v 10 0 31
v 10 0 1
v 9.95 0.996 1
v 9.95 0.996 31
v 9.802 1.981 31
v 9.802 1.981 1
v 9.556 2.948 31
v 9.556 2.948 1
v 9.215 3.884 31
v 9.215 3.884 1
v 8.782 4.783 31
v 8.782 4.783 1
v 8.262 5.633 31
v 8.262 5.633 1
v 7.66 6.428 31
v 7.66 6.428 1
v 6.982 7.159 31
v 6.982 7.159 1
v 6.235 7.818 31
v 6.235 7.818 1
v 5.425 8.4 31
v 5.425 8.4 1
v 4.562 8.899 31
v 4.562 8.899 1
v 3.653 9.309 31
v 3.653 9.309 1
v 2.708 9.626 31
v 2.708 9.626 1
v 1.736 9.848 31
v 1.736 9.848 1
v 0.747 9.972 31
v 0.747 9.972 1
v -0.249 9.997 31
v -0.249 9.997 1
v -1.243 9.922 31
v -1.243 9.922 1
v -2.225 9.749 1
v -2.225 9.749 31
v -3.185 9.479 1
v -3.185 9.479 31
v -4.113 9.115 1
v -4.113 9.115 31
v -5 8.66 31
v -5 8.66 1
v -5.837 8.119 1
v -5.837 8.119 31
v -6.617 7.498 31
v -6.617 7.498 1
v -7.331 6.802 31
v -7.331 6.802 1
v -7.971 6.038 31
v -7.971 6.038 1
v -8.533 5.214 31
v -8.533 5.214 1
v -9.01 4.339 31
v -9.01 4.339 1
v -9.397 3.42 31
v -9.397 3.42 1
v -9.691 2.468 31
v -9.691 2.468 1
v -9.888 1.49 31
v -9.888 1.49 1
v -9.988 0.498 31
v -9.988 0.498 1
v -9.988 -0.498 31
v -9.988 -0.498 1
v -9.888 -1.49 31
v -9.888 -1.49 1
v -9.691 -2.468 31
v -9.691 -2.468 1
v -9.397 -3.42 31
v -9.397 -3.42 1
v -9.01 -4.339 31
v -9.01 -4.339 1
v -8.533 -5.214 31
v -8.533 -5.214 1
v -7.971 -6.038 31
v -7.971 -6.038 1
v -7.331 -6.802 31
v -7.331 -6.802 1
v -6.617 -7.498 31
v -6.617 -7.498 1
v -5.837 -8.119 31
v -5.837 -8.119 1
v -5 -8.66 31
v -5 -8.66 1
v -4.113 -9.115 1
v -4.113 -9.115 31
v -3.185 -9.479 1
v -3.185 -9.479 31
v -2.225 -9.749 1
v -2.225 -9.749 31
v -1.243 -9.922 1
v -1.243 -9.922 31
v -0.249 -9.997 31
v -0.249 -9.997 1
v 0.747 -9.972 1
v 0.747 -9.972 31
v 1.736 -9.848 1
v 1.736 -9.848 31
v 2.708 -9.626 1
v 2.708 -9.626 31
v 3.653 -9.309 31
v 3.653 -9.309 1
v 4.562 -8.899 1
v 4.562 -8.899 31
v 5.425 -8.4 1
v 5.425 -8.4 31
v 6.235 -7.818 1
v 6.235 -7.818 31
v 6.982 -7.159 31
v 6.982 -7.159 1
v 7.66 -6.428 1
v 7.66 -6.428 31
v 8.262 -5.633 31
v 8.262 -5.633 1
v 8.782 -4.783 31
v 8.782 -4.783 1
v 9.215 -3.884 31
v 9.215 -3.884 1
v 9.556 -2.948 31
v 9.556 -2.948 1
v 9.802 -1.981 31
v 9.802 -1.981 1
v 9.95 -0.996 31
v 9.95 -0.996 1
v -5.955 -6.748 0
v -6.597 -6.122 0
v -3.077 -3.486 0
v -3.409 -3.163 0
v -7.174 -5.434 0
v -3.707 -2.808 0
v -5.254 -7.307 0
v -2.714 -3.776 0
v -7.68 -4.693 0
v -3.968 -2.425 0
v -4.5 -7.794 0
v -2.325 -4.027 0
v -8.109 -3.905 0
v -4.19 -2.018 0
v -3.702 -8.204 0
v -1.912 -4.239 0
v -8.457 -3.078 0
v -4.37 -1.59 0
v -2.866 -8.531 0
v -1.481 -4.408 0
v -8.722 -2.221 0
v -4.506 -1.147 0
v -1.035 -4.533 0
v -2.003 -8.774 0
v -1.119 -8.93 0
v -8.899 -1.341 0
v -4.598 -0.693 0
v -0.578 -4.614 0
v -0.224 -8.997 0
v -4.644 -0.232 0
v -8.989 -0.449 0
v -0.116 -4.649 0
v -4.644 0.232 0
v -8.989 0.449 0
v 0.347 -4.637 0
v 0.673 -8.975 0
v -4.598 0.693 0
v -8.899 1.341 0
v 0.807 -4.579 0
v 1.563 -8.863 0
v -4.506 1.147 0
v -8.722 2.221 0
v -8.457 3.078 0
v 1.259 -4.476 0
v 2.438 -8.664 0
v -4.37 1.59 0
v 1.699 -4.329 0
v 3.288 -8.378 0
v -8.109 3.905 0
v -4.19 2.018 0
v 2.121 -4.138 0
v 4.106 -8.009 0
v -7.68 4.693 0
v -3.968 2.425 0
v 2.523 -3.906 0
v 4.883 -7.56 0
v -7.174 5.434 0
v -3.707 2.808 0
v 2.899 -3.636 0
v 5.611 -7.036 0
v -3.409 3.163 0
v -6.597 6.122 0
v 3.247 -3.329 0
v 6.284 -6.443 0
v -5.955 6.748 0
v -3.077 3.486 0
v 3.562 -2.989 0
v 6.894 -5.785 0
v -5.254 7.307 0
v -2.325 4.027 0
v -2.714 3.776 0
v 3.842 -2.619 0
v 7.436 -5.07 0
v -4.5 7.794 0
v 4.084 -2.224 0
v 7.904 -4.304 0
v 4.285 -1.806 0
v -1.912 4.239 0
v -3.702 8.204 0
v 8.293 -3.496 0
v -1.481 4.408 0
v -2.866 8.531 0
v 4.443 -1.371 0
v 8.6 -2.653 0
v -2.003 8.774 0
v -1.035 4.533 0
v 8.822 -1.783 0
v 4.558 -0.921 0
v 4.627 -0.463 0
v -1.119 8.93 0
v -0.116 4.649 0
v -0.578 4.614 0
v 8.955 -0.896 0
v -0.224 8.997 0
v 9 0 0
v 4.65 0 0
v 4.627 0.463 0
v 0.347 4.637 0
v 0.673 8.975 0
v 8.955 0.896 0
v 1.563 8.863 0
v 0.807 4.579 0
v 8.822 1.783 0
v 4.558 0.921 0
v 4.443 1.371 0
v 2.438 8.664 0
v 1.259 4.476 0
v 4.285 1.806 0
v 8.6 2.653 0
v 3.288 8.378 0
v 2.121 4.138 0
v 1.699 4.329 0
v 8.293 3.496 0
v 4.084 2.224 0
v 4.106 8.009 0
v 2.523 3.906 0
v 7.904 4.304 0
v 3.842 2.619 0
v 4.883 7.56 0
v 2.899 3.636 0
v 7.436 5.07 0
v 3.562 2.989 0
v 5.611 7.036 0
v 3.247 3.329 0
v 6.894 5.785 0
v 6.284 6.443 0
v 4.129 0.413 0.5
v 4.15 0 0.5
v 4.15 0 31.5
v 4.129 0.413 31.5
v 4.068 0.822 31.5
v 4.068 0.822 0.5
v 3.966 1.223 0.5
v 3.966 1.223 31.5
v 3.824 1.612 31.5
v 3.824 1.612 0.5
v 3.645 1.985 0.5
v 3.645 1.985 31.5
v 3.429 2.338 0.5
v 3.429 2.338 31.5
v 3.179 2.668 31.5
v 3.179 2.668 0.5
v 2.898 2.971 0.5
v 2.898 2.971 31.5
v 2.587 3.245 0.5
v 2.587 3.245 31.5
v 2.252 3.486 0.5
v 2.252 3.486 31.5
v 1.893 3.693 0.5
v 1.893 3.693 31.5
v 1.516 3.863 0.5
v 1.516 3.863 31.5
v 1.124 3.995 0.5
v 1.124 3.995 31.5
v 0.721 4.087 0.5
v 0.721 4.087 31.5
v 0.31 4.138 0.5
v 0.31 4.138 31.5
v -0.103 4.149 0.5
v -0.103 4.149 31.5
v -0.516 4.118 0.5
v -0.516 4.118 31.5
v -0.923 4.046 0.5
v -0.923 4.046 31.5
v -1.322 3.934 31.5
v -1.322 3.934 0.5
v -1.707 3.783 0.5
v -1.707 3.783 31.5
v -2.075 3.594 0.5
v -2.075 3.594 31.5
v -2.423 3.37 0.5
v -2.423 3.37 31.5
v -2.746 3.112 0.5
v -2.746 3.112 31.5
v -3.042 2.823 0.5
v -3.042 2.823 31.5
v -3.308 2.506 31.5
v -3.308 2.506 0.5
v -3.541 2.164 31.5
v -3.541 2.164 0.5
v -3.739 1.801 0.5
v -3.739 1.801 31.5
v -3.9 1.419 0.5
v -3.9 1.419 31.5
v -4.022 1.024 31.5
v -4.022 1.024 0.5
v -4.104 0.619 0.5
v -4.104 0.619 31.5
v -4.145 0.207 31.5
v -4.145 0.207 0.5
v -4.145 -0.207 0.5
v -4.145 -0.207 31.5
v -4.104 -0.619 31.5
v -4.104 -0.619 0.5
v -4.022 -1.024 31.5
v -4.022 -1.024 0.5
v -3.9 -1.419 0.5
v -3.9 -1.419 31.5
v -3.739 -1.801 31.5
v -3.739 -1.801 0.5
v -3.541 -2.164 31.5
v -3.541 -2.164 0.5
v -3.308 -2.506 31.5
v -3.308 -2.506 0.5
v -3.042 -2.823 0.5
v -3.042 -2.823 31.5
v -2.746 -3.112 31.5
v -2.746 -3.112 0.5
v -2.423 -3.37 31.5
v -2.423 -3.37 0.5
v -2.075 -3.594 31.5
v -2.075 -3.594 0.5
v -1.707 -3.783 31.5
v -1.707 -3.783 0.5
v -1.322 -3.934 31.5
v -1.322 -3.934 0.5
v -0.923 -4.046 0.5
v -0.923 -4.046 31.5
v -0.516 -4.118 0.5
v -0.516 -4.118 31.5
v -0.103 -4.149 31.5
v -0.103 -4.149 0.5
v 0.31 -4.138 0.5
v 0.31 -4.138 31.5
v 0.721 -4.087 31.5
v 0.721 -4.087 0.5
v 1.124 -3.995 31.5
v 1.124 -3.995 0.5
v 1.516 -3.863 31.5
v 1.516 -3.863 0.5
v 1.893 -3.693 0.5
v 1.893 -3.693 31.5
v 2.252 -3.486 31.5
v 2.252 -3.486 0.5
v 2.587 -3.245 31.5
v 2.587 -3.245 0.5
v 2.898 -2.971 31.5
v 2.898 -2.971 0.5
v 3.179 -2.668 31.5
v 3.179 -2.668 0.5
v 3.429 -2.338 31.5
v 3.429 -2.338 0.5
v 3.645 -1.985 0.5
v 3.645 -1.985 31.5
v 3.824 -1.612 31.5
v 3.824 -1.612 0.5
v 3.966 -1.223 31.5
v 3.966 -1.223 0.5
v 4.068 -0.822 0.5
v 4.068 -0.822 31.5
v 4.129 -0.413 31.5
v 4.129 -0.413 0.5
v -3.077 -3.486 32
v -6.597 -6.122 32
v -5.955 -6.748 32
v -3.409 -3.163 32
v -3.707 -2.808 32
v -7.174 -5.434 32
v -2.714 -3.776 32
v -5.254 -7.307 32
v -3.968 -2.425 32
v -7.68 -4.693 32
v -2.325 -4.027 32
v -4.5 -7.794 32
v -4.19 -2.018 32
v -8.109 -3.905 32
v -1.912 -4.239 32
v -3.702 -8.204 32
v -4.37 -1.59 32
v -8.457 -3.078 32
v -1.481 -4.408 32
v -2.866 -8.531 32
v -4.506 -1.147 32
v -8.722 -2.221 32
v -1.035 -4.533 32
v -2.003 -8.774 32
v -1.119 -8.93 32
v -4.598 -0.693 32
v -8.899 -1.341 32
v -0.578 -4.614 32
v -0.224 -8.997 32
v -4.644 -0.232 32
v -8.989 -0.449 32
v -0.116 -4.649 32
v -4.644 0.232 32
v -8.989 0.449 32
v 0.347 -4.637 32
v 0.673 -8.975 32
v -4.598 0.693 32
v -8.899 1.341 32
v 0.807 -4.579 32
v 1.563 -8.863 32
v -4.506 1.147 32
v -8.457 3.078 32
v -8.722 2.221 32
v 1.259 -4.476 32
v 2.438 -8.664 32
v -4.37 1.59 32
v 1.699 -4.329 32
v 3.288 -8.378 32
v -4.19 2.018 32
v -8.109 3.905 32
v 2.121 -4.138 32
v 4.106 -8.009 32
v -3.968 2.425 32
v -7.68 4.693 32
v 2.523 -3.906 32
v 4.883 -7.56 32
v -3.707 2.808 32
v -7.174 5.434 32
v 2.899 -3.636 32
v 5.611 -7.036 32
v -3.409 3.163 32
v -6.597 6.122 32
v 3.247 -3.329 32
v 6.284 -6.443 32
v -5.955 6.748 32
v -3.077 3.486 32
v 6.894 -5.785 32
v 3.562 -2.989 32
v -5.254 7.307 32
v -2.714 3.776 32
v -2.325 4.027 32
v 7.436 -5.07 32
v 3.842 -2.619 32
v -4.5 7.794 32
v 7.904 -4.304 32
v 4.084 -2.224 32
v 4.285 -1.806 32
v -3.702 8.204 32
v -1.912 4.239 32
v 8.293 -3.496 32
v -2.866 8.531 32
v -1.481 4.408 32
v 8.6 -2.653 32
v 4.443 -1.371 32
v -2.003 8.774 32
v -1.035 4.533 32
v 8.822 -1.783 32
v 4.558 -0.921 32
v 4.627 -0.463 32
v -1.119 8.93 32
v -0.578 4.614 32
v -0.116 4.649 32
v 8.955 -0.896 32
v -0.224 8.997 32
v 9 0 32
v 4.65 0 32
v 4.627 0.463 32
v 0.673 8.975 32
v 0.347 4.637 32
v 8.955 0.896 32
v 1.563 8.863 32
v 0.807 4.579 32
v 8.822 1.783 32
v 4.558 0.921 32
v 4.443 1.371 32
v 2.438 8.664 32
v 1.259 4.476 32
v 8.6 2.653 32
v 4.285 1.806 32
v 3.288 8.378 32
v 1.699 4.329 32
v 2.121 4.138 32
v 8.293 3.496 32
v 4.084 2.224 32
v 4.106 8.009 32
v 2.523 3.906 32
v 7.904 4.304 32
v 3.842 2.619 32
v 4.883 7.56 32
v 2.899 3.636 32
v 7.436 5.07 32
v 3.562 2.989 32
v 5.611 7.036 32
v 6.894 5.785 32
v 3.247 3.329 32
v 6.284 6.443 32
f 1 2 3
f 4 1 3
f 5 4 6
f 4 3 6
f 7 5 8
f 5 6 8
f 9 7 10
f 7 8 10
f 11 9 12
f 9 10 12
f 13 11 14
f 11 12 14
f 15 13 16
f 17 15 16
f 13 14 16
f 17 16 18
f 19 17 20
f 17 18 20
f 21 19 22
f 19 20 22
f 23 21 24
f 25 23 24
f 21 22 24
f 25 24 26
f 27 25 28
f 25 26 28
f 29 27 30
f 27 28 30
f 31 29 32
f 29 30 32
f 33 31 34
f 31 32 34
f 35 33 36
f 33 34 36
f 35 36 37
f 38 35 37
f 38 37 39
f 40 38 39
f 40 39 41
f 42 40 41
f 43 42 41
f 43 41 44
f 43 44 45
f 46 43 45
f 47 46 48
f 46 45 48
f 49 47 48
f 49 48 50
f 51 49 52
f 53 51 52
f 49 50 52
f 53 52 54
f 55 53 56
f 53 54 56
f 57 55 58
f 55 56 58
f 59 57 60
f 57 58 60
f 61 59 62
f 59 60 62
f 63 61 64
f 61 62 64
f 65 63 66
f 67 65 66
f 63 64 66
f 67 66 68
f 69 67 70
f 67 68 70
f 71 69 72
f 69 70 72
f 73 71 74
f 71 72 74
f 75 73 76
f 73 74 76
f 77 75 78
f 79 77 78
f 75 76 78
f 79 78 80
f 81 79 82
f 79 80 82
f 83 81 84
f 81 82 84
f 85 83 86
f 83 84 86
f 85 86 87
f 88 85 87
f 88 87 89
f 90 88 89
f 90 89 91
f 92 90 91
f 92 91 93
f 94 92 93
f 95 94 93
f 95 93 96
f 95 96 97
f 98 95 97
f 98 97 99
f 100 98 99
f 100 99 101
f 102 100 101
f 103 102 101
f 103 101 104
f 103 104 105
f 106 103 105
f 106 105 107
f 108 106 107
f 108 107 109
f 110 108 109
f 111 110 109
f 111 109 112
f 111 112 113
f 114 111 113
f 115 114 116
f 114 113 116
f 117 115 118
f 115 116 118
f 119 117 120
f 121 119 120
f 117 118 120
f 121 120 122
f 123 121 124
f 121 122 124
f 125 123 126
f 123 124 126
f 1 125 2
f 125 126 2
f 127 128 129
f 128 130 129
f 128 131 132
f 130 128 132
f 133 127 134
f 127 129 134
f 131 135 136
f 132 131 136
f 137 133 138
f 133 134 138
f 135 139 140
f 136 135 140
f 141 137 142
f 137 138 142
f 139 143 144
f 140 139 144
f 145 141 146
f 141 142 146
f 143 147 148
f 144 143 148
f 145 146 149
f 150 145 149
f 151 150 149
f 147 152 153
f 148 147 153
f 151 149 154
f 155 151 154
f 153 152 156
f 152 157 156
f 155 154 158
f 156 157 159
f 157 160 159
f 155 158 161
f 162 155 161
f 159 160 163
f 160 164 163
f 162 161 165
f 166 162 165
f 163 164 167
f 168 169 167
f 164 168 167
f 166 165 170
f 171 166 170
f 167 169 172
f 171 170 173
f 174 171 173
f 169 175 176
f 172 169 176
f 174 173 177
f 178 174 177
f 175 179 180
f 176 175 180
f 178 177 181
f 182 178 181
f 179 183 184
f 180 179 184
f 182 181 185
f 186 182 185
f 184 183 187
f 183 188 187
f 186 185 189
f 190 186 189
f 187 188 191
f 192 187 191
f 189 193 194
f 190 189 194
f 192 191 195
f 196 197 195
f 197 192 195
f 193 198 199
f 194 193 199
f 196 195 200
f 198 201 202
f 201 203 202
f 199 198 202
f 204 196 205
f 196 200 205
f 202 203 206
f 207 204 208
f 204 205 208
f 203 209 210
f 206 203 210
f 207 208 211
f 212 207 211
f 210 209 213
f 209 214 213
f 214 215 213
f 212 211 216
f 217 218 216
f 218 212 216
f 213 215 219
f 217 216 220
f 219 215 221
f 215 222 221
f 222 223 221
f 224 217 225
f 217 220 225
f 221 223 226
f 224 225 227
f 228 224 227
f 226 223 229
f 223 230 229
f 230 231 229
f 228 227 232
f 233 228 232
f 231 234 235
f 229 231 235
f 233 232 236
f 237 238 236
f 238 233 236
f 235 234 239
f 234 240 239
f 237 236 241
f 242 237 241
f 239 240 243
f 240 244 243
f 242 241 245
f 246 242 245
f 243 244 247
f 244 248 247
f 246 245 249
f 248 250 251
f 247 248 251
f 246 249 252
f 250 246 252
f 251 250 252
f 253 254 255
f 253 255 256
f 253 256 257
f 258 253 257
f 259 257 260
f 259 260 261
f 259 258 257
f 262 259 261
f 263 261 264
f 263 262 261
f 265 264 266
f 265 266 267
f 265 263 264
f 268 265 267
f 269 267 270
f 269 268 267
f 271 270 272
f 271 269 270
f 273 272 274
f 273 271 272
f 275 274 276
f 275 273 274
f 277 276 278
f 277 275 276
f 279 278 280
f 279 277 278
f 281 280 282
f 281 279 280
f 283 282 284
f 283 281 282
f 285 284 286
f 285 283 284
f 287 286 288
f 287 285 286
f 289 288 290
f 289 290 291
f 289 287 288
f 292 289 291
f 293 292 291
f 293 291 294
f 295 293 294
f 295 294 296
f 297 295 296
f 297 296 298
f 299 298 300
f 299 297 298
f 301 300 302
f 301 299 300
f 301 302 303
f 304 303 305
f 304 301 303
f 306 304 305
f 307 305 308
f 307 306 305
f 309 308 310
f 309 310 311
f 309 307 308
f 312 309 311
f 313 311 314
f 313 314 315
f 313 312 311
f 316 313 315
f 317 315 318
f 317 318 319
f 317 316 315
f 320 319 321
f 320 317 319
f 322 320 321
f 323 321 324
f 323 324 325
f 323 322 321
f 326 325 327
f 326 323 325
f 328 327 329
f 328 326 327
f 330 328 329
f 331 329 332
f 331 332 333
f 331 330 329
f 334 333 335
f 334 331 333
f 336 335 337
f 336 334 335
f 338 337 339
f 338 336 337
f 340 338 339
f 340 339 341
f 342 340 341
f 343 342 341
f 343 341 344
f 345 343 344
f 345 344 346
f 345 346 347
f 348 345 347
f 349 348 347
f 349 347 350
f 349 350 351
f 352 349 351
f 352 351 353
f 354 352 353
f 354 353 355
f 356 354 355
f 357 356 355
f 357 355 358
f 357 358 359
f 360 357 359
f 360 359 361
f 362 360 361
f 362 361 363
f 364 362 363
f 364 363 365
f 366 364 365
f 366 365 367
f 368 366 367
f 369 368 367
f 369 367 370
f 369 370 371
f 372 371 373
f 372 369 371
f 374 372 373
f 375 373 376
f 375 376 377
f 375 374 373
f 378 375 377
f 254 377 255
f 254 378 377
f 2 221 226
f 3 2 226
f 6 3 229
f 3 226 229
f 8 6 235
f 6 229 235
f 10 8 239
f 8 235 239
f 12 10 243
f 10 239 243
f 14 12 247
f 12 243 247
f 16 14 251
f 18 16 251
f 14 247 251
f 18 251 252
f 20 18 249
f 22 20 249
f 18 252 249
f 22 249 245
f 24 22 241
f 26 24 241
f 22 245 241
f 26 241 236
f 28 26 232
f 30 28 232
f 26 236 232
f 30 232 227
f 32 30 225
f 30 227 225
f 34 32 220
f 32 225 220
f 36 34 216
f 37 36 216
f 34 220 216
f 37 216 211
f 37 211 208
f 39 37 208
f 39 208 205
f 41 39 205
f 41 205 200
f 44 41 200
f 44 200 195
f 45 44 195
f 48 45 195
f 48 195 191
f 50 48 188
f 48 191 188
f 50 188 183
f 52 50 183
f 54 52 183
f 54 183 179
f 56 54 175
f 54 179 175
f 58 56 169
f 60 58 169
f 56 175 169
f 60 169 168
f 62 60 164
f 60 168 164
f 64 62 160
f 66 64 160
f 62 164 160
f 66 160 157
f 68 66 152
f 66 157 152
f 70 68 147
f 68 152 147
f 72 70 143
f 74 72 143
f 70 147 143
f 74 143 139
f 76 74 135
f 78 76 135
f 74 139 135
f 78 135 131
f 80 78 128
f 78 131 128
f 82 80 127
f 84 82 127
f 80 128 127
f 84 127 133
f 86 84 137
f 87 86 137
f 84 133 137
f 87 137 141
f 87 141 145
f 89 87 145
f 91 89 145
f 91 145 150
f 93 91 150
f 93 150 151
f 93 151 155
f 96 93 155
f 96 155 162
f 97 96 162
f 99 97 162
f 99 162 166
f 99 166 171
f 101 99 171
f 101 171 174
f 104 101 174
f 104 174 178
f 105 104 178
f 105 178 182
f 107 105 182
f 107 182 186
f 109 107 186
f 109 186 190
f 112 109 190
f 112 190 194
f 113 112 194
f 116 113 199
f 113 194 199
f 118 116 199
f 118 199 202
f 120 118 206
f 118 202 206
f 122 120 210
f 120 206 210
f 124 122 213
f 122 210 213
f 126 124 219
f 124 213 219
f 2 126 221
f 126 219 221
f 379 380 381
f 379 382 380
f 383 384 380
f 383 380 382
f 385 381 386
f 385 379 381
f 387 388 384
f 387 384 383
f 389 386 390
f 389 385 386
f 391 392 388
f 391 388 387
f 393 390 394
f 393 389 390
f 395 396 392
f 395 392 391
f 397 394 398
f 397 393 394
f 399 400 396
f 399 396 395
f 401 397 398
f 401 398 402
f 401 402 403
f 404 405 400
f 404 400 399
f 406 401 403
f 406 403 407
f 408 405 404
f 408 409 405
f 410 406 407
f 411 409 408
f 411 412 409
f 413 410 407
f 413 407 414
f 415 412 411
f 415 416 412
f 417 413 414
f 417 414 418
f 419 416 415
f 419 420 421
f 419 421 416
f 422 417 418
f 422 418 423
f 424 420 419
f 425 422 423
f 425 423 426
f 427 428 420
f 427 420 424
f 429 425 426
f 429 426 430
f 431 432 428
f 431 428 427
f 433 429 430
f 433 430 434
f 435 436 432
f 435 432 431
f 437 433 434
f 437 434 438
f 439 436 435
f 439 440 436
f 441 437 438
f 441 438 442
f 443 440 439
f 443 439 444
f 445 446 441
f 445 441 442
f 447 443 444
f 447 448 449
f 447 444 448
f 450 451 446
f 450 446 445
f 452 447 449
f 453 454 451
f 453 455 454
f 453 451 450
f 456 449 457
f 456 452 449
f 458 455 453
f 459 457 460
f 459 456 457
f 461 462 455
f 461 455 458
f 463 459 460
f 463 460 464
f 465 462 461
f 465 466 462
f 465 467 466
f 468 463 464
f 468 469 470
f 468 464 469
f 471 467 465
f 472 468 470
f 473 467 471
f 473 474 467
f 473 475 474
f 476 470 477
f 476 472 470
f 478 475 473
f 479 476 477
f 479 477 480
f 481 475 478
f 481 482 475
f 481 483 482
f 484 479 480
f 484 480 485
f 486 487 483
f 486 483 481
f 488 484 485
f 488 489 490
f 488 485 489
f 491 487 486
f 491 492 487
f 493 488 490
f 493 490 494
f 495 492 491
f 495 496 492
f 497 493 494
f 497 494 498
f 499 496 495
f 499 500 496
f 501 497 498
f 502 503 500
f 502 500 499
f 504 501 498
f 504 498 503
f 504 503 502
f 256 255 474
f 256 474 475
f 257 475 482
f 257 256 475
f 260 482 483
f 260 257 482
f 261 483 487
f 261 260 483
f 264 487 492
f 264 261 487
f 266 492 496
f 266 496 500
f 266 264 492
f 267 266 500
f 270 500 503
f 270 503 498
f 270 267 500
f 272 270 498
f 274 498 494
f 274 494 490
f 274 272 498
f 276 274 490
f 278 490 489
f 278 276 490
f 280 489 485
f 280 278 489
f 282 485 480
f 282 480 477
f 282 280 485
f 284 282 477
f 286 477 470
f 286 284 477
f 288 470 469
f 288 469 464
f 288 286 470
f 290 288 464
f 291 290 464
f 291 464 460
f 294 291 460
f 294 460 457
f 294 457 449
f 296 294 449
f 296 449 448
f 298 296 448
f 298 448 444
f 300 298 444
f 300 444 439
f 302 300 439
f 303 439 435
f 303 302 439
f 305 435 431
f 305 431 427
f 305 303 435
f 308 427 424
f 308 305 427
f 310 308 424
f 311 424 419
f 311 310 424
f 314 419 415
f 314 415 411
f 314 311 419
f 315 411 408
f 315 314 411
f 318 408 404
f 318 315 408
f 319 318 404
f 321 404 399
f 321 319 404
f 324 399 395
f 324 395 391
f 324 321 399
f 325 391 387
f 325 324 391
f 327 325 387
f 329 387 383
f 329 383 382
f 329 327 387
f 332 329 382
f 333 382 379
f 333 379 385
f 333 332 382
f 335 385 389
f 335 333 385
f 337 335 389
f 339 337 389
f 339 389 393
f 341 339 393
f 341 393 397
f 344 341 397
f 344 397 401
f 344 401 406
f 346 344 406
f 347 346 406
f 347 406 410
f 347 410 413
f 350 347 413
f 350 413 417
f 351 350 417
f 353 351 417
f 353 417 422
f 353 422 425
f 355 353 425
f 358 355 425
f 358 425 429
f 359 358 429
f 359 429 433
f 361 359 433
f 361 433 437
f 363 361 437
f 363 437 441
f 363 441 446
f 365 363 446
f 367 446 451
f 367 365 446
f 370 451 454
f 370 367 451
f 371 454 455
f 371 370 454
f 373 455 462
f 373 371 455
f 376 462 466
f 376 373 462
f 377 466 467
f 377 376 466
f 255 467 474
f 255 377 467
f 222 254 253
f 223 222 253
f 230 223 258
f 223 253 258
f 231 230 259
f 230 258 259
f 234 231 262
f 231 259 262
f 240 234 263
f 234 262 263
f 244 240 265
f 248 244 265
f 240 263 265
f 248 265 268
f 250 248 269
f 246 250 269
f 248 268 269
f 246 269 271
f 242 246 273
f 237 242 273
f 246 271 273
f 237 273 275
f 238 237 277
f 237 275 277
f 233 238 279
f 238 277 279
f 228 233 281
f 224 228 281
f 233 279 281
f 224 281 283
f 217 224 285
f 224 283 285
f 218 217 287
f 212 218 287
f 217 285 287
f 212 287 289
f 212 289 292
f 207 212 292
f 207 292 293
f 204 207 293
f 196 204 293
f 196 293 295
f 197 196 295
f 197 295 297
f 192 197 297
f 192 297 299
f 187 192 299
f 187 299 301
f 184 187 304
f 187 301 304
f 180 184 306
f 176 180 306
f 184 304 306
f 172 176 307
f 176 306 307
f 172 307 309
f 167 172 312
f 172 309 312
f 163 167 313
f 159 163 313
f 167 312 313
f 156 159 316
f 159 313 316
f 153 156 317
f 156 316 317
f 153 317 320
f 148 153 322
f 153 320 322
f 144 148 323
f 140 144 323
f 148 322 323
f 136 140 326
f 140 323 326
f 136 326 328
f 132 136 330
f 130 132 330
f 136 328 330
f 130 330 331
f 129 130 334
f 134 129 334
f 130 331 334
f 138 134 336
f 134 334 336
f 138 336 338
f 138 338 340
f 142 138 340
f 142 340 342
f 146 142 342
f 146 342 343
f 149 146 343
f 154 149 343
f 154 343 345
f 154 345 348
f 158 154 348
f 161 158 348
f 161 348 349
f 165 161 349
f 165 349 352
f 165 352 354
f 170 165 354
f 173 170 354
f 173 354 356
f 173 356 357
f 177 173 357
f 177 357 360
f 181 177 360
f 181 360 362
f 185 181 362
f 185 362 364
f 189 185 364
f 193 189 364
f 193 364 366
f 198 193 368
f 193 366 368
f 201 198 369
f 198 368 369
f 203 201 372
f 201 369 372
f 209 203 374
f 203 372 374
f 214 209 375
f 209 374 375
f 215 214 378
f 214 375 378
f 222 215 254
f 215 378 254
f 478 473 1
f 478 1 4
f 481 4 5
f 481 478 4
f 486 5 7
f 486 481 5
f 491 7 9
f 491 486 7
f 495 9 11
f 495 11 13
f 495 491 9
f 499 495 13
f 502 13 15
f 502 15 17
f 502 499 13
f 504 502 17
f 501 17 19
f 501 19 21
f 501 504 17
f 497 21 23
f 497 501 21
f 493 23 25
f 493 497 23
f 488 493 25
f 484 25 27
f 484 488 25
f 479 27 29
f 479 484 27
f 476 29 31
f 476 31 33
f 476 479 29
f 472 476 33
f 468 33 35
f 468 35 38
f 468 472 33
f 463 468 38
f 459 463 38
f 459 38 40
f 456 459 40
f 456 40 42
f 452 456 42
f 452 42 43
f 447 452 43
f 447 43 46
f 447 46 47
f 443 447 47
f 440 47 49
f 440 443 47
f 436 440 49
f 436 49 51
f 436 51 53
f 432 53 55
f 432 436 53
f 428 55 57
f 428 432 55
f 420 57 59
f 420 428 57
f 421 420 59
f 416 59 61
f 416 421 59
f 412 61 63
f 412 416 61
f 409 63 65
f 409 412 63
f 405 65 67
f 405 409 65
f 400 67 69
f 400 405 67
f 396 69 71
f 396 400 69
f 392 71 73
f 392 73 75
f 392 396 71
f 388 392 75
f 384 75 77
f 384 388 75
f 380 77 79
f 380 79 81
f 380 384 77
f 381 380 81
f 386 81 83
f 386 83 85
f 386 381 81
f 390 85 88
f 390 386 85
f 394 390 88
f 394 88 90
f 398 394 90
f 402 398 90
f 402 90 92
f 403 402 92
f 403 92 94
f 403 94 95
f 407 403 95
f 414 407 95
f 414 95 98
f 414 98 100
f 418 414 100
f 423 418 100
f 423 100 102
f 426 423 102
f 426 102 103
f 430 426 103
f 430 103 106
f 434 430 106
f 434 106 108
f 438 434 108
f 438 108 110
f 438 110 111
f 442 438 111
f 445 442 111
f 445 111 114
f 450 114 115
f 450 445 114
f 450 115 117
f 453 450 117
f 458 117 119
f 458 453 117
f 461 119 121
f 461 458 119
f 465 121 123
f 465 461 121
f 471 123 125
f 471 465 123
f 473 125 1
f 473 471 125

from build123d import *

# Parameters (mm, degrees)
F0_R     = 10
F0_R_2   = 4.15
F1_DEPTH = 32
F2_SIZE  = 1
F3_SIZE  = 0.5


with BuildPart() as f1:
    # F0 (on Top) → F1 (new body)
    with BuildSketch(Plane.XY):
        Circle(F0_R)
        Circle(F0_R_2, mode=Mode.SUBTRACT)
    extrude(amount=F1_DEPTH)

    # F2
    f2_edges = [f1.edges().sort_by_distance(p)[0] for p in [
        (-10, 0, 32),
        (10, 0, 16),
        (-10, 0, 0),
    ]]
    chamfer(f2_edges, length=F2_SIZE)

    # F3
    f3_edges = [f1.edges().sort_by_distance(p)[0] for p in [
        (4.15, 0, 16),
        (-4.15, 0, 0),
        (-4.15, 0, 32),
    ]]
    chamfer(f3_edges, length=F3_SIZE)


solid = f1.part
